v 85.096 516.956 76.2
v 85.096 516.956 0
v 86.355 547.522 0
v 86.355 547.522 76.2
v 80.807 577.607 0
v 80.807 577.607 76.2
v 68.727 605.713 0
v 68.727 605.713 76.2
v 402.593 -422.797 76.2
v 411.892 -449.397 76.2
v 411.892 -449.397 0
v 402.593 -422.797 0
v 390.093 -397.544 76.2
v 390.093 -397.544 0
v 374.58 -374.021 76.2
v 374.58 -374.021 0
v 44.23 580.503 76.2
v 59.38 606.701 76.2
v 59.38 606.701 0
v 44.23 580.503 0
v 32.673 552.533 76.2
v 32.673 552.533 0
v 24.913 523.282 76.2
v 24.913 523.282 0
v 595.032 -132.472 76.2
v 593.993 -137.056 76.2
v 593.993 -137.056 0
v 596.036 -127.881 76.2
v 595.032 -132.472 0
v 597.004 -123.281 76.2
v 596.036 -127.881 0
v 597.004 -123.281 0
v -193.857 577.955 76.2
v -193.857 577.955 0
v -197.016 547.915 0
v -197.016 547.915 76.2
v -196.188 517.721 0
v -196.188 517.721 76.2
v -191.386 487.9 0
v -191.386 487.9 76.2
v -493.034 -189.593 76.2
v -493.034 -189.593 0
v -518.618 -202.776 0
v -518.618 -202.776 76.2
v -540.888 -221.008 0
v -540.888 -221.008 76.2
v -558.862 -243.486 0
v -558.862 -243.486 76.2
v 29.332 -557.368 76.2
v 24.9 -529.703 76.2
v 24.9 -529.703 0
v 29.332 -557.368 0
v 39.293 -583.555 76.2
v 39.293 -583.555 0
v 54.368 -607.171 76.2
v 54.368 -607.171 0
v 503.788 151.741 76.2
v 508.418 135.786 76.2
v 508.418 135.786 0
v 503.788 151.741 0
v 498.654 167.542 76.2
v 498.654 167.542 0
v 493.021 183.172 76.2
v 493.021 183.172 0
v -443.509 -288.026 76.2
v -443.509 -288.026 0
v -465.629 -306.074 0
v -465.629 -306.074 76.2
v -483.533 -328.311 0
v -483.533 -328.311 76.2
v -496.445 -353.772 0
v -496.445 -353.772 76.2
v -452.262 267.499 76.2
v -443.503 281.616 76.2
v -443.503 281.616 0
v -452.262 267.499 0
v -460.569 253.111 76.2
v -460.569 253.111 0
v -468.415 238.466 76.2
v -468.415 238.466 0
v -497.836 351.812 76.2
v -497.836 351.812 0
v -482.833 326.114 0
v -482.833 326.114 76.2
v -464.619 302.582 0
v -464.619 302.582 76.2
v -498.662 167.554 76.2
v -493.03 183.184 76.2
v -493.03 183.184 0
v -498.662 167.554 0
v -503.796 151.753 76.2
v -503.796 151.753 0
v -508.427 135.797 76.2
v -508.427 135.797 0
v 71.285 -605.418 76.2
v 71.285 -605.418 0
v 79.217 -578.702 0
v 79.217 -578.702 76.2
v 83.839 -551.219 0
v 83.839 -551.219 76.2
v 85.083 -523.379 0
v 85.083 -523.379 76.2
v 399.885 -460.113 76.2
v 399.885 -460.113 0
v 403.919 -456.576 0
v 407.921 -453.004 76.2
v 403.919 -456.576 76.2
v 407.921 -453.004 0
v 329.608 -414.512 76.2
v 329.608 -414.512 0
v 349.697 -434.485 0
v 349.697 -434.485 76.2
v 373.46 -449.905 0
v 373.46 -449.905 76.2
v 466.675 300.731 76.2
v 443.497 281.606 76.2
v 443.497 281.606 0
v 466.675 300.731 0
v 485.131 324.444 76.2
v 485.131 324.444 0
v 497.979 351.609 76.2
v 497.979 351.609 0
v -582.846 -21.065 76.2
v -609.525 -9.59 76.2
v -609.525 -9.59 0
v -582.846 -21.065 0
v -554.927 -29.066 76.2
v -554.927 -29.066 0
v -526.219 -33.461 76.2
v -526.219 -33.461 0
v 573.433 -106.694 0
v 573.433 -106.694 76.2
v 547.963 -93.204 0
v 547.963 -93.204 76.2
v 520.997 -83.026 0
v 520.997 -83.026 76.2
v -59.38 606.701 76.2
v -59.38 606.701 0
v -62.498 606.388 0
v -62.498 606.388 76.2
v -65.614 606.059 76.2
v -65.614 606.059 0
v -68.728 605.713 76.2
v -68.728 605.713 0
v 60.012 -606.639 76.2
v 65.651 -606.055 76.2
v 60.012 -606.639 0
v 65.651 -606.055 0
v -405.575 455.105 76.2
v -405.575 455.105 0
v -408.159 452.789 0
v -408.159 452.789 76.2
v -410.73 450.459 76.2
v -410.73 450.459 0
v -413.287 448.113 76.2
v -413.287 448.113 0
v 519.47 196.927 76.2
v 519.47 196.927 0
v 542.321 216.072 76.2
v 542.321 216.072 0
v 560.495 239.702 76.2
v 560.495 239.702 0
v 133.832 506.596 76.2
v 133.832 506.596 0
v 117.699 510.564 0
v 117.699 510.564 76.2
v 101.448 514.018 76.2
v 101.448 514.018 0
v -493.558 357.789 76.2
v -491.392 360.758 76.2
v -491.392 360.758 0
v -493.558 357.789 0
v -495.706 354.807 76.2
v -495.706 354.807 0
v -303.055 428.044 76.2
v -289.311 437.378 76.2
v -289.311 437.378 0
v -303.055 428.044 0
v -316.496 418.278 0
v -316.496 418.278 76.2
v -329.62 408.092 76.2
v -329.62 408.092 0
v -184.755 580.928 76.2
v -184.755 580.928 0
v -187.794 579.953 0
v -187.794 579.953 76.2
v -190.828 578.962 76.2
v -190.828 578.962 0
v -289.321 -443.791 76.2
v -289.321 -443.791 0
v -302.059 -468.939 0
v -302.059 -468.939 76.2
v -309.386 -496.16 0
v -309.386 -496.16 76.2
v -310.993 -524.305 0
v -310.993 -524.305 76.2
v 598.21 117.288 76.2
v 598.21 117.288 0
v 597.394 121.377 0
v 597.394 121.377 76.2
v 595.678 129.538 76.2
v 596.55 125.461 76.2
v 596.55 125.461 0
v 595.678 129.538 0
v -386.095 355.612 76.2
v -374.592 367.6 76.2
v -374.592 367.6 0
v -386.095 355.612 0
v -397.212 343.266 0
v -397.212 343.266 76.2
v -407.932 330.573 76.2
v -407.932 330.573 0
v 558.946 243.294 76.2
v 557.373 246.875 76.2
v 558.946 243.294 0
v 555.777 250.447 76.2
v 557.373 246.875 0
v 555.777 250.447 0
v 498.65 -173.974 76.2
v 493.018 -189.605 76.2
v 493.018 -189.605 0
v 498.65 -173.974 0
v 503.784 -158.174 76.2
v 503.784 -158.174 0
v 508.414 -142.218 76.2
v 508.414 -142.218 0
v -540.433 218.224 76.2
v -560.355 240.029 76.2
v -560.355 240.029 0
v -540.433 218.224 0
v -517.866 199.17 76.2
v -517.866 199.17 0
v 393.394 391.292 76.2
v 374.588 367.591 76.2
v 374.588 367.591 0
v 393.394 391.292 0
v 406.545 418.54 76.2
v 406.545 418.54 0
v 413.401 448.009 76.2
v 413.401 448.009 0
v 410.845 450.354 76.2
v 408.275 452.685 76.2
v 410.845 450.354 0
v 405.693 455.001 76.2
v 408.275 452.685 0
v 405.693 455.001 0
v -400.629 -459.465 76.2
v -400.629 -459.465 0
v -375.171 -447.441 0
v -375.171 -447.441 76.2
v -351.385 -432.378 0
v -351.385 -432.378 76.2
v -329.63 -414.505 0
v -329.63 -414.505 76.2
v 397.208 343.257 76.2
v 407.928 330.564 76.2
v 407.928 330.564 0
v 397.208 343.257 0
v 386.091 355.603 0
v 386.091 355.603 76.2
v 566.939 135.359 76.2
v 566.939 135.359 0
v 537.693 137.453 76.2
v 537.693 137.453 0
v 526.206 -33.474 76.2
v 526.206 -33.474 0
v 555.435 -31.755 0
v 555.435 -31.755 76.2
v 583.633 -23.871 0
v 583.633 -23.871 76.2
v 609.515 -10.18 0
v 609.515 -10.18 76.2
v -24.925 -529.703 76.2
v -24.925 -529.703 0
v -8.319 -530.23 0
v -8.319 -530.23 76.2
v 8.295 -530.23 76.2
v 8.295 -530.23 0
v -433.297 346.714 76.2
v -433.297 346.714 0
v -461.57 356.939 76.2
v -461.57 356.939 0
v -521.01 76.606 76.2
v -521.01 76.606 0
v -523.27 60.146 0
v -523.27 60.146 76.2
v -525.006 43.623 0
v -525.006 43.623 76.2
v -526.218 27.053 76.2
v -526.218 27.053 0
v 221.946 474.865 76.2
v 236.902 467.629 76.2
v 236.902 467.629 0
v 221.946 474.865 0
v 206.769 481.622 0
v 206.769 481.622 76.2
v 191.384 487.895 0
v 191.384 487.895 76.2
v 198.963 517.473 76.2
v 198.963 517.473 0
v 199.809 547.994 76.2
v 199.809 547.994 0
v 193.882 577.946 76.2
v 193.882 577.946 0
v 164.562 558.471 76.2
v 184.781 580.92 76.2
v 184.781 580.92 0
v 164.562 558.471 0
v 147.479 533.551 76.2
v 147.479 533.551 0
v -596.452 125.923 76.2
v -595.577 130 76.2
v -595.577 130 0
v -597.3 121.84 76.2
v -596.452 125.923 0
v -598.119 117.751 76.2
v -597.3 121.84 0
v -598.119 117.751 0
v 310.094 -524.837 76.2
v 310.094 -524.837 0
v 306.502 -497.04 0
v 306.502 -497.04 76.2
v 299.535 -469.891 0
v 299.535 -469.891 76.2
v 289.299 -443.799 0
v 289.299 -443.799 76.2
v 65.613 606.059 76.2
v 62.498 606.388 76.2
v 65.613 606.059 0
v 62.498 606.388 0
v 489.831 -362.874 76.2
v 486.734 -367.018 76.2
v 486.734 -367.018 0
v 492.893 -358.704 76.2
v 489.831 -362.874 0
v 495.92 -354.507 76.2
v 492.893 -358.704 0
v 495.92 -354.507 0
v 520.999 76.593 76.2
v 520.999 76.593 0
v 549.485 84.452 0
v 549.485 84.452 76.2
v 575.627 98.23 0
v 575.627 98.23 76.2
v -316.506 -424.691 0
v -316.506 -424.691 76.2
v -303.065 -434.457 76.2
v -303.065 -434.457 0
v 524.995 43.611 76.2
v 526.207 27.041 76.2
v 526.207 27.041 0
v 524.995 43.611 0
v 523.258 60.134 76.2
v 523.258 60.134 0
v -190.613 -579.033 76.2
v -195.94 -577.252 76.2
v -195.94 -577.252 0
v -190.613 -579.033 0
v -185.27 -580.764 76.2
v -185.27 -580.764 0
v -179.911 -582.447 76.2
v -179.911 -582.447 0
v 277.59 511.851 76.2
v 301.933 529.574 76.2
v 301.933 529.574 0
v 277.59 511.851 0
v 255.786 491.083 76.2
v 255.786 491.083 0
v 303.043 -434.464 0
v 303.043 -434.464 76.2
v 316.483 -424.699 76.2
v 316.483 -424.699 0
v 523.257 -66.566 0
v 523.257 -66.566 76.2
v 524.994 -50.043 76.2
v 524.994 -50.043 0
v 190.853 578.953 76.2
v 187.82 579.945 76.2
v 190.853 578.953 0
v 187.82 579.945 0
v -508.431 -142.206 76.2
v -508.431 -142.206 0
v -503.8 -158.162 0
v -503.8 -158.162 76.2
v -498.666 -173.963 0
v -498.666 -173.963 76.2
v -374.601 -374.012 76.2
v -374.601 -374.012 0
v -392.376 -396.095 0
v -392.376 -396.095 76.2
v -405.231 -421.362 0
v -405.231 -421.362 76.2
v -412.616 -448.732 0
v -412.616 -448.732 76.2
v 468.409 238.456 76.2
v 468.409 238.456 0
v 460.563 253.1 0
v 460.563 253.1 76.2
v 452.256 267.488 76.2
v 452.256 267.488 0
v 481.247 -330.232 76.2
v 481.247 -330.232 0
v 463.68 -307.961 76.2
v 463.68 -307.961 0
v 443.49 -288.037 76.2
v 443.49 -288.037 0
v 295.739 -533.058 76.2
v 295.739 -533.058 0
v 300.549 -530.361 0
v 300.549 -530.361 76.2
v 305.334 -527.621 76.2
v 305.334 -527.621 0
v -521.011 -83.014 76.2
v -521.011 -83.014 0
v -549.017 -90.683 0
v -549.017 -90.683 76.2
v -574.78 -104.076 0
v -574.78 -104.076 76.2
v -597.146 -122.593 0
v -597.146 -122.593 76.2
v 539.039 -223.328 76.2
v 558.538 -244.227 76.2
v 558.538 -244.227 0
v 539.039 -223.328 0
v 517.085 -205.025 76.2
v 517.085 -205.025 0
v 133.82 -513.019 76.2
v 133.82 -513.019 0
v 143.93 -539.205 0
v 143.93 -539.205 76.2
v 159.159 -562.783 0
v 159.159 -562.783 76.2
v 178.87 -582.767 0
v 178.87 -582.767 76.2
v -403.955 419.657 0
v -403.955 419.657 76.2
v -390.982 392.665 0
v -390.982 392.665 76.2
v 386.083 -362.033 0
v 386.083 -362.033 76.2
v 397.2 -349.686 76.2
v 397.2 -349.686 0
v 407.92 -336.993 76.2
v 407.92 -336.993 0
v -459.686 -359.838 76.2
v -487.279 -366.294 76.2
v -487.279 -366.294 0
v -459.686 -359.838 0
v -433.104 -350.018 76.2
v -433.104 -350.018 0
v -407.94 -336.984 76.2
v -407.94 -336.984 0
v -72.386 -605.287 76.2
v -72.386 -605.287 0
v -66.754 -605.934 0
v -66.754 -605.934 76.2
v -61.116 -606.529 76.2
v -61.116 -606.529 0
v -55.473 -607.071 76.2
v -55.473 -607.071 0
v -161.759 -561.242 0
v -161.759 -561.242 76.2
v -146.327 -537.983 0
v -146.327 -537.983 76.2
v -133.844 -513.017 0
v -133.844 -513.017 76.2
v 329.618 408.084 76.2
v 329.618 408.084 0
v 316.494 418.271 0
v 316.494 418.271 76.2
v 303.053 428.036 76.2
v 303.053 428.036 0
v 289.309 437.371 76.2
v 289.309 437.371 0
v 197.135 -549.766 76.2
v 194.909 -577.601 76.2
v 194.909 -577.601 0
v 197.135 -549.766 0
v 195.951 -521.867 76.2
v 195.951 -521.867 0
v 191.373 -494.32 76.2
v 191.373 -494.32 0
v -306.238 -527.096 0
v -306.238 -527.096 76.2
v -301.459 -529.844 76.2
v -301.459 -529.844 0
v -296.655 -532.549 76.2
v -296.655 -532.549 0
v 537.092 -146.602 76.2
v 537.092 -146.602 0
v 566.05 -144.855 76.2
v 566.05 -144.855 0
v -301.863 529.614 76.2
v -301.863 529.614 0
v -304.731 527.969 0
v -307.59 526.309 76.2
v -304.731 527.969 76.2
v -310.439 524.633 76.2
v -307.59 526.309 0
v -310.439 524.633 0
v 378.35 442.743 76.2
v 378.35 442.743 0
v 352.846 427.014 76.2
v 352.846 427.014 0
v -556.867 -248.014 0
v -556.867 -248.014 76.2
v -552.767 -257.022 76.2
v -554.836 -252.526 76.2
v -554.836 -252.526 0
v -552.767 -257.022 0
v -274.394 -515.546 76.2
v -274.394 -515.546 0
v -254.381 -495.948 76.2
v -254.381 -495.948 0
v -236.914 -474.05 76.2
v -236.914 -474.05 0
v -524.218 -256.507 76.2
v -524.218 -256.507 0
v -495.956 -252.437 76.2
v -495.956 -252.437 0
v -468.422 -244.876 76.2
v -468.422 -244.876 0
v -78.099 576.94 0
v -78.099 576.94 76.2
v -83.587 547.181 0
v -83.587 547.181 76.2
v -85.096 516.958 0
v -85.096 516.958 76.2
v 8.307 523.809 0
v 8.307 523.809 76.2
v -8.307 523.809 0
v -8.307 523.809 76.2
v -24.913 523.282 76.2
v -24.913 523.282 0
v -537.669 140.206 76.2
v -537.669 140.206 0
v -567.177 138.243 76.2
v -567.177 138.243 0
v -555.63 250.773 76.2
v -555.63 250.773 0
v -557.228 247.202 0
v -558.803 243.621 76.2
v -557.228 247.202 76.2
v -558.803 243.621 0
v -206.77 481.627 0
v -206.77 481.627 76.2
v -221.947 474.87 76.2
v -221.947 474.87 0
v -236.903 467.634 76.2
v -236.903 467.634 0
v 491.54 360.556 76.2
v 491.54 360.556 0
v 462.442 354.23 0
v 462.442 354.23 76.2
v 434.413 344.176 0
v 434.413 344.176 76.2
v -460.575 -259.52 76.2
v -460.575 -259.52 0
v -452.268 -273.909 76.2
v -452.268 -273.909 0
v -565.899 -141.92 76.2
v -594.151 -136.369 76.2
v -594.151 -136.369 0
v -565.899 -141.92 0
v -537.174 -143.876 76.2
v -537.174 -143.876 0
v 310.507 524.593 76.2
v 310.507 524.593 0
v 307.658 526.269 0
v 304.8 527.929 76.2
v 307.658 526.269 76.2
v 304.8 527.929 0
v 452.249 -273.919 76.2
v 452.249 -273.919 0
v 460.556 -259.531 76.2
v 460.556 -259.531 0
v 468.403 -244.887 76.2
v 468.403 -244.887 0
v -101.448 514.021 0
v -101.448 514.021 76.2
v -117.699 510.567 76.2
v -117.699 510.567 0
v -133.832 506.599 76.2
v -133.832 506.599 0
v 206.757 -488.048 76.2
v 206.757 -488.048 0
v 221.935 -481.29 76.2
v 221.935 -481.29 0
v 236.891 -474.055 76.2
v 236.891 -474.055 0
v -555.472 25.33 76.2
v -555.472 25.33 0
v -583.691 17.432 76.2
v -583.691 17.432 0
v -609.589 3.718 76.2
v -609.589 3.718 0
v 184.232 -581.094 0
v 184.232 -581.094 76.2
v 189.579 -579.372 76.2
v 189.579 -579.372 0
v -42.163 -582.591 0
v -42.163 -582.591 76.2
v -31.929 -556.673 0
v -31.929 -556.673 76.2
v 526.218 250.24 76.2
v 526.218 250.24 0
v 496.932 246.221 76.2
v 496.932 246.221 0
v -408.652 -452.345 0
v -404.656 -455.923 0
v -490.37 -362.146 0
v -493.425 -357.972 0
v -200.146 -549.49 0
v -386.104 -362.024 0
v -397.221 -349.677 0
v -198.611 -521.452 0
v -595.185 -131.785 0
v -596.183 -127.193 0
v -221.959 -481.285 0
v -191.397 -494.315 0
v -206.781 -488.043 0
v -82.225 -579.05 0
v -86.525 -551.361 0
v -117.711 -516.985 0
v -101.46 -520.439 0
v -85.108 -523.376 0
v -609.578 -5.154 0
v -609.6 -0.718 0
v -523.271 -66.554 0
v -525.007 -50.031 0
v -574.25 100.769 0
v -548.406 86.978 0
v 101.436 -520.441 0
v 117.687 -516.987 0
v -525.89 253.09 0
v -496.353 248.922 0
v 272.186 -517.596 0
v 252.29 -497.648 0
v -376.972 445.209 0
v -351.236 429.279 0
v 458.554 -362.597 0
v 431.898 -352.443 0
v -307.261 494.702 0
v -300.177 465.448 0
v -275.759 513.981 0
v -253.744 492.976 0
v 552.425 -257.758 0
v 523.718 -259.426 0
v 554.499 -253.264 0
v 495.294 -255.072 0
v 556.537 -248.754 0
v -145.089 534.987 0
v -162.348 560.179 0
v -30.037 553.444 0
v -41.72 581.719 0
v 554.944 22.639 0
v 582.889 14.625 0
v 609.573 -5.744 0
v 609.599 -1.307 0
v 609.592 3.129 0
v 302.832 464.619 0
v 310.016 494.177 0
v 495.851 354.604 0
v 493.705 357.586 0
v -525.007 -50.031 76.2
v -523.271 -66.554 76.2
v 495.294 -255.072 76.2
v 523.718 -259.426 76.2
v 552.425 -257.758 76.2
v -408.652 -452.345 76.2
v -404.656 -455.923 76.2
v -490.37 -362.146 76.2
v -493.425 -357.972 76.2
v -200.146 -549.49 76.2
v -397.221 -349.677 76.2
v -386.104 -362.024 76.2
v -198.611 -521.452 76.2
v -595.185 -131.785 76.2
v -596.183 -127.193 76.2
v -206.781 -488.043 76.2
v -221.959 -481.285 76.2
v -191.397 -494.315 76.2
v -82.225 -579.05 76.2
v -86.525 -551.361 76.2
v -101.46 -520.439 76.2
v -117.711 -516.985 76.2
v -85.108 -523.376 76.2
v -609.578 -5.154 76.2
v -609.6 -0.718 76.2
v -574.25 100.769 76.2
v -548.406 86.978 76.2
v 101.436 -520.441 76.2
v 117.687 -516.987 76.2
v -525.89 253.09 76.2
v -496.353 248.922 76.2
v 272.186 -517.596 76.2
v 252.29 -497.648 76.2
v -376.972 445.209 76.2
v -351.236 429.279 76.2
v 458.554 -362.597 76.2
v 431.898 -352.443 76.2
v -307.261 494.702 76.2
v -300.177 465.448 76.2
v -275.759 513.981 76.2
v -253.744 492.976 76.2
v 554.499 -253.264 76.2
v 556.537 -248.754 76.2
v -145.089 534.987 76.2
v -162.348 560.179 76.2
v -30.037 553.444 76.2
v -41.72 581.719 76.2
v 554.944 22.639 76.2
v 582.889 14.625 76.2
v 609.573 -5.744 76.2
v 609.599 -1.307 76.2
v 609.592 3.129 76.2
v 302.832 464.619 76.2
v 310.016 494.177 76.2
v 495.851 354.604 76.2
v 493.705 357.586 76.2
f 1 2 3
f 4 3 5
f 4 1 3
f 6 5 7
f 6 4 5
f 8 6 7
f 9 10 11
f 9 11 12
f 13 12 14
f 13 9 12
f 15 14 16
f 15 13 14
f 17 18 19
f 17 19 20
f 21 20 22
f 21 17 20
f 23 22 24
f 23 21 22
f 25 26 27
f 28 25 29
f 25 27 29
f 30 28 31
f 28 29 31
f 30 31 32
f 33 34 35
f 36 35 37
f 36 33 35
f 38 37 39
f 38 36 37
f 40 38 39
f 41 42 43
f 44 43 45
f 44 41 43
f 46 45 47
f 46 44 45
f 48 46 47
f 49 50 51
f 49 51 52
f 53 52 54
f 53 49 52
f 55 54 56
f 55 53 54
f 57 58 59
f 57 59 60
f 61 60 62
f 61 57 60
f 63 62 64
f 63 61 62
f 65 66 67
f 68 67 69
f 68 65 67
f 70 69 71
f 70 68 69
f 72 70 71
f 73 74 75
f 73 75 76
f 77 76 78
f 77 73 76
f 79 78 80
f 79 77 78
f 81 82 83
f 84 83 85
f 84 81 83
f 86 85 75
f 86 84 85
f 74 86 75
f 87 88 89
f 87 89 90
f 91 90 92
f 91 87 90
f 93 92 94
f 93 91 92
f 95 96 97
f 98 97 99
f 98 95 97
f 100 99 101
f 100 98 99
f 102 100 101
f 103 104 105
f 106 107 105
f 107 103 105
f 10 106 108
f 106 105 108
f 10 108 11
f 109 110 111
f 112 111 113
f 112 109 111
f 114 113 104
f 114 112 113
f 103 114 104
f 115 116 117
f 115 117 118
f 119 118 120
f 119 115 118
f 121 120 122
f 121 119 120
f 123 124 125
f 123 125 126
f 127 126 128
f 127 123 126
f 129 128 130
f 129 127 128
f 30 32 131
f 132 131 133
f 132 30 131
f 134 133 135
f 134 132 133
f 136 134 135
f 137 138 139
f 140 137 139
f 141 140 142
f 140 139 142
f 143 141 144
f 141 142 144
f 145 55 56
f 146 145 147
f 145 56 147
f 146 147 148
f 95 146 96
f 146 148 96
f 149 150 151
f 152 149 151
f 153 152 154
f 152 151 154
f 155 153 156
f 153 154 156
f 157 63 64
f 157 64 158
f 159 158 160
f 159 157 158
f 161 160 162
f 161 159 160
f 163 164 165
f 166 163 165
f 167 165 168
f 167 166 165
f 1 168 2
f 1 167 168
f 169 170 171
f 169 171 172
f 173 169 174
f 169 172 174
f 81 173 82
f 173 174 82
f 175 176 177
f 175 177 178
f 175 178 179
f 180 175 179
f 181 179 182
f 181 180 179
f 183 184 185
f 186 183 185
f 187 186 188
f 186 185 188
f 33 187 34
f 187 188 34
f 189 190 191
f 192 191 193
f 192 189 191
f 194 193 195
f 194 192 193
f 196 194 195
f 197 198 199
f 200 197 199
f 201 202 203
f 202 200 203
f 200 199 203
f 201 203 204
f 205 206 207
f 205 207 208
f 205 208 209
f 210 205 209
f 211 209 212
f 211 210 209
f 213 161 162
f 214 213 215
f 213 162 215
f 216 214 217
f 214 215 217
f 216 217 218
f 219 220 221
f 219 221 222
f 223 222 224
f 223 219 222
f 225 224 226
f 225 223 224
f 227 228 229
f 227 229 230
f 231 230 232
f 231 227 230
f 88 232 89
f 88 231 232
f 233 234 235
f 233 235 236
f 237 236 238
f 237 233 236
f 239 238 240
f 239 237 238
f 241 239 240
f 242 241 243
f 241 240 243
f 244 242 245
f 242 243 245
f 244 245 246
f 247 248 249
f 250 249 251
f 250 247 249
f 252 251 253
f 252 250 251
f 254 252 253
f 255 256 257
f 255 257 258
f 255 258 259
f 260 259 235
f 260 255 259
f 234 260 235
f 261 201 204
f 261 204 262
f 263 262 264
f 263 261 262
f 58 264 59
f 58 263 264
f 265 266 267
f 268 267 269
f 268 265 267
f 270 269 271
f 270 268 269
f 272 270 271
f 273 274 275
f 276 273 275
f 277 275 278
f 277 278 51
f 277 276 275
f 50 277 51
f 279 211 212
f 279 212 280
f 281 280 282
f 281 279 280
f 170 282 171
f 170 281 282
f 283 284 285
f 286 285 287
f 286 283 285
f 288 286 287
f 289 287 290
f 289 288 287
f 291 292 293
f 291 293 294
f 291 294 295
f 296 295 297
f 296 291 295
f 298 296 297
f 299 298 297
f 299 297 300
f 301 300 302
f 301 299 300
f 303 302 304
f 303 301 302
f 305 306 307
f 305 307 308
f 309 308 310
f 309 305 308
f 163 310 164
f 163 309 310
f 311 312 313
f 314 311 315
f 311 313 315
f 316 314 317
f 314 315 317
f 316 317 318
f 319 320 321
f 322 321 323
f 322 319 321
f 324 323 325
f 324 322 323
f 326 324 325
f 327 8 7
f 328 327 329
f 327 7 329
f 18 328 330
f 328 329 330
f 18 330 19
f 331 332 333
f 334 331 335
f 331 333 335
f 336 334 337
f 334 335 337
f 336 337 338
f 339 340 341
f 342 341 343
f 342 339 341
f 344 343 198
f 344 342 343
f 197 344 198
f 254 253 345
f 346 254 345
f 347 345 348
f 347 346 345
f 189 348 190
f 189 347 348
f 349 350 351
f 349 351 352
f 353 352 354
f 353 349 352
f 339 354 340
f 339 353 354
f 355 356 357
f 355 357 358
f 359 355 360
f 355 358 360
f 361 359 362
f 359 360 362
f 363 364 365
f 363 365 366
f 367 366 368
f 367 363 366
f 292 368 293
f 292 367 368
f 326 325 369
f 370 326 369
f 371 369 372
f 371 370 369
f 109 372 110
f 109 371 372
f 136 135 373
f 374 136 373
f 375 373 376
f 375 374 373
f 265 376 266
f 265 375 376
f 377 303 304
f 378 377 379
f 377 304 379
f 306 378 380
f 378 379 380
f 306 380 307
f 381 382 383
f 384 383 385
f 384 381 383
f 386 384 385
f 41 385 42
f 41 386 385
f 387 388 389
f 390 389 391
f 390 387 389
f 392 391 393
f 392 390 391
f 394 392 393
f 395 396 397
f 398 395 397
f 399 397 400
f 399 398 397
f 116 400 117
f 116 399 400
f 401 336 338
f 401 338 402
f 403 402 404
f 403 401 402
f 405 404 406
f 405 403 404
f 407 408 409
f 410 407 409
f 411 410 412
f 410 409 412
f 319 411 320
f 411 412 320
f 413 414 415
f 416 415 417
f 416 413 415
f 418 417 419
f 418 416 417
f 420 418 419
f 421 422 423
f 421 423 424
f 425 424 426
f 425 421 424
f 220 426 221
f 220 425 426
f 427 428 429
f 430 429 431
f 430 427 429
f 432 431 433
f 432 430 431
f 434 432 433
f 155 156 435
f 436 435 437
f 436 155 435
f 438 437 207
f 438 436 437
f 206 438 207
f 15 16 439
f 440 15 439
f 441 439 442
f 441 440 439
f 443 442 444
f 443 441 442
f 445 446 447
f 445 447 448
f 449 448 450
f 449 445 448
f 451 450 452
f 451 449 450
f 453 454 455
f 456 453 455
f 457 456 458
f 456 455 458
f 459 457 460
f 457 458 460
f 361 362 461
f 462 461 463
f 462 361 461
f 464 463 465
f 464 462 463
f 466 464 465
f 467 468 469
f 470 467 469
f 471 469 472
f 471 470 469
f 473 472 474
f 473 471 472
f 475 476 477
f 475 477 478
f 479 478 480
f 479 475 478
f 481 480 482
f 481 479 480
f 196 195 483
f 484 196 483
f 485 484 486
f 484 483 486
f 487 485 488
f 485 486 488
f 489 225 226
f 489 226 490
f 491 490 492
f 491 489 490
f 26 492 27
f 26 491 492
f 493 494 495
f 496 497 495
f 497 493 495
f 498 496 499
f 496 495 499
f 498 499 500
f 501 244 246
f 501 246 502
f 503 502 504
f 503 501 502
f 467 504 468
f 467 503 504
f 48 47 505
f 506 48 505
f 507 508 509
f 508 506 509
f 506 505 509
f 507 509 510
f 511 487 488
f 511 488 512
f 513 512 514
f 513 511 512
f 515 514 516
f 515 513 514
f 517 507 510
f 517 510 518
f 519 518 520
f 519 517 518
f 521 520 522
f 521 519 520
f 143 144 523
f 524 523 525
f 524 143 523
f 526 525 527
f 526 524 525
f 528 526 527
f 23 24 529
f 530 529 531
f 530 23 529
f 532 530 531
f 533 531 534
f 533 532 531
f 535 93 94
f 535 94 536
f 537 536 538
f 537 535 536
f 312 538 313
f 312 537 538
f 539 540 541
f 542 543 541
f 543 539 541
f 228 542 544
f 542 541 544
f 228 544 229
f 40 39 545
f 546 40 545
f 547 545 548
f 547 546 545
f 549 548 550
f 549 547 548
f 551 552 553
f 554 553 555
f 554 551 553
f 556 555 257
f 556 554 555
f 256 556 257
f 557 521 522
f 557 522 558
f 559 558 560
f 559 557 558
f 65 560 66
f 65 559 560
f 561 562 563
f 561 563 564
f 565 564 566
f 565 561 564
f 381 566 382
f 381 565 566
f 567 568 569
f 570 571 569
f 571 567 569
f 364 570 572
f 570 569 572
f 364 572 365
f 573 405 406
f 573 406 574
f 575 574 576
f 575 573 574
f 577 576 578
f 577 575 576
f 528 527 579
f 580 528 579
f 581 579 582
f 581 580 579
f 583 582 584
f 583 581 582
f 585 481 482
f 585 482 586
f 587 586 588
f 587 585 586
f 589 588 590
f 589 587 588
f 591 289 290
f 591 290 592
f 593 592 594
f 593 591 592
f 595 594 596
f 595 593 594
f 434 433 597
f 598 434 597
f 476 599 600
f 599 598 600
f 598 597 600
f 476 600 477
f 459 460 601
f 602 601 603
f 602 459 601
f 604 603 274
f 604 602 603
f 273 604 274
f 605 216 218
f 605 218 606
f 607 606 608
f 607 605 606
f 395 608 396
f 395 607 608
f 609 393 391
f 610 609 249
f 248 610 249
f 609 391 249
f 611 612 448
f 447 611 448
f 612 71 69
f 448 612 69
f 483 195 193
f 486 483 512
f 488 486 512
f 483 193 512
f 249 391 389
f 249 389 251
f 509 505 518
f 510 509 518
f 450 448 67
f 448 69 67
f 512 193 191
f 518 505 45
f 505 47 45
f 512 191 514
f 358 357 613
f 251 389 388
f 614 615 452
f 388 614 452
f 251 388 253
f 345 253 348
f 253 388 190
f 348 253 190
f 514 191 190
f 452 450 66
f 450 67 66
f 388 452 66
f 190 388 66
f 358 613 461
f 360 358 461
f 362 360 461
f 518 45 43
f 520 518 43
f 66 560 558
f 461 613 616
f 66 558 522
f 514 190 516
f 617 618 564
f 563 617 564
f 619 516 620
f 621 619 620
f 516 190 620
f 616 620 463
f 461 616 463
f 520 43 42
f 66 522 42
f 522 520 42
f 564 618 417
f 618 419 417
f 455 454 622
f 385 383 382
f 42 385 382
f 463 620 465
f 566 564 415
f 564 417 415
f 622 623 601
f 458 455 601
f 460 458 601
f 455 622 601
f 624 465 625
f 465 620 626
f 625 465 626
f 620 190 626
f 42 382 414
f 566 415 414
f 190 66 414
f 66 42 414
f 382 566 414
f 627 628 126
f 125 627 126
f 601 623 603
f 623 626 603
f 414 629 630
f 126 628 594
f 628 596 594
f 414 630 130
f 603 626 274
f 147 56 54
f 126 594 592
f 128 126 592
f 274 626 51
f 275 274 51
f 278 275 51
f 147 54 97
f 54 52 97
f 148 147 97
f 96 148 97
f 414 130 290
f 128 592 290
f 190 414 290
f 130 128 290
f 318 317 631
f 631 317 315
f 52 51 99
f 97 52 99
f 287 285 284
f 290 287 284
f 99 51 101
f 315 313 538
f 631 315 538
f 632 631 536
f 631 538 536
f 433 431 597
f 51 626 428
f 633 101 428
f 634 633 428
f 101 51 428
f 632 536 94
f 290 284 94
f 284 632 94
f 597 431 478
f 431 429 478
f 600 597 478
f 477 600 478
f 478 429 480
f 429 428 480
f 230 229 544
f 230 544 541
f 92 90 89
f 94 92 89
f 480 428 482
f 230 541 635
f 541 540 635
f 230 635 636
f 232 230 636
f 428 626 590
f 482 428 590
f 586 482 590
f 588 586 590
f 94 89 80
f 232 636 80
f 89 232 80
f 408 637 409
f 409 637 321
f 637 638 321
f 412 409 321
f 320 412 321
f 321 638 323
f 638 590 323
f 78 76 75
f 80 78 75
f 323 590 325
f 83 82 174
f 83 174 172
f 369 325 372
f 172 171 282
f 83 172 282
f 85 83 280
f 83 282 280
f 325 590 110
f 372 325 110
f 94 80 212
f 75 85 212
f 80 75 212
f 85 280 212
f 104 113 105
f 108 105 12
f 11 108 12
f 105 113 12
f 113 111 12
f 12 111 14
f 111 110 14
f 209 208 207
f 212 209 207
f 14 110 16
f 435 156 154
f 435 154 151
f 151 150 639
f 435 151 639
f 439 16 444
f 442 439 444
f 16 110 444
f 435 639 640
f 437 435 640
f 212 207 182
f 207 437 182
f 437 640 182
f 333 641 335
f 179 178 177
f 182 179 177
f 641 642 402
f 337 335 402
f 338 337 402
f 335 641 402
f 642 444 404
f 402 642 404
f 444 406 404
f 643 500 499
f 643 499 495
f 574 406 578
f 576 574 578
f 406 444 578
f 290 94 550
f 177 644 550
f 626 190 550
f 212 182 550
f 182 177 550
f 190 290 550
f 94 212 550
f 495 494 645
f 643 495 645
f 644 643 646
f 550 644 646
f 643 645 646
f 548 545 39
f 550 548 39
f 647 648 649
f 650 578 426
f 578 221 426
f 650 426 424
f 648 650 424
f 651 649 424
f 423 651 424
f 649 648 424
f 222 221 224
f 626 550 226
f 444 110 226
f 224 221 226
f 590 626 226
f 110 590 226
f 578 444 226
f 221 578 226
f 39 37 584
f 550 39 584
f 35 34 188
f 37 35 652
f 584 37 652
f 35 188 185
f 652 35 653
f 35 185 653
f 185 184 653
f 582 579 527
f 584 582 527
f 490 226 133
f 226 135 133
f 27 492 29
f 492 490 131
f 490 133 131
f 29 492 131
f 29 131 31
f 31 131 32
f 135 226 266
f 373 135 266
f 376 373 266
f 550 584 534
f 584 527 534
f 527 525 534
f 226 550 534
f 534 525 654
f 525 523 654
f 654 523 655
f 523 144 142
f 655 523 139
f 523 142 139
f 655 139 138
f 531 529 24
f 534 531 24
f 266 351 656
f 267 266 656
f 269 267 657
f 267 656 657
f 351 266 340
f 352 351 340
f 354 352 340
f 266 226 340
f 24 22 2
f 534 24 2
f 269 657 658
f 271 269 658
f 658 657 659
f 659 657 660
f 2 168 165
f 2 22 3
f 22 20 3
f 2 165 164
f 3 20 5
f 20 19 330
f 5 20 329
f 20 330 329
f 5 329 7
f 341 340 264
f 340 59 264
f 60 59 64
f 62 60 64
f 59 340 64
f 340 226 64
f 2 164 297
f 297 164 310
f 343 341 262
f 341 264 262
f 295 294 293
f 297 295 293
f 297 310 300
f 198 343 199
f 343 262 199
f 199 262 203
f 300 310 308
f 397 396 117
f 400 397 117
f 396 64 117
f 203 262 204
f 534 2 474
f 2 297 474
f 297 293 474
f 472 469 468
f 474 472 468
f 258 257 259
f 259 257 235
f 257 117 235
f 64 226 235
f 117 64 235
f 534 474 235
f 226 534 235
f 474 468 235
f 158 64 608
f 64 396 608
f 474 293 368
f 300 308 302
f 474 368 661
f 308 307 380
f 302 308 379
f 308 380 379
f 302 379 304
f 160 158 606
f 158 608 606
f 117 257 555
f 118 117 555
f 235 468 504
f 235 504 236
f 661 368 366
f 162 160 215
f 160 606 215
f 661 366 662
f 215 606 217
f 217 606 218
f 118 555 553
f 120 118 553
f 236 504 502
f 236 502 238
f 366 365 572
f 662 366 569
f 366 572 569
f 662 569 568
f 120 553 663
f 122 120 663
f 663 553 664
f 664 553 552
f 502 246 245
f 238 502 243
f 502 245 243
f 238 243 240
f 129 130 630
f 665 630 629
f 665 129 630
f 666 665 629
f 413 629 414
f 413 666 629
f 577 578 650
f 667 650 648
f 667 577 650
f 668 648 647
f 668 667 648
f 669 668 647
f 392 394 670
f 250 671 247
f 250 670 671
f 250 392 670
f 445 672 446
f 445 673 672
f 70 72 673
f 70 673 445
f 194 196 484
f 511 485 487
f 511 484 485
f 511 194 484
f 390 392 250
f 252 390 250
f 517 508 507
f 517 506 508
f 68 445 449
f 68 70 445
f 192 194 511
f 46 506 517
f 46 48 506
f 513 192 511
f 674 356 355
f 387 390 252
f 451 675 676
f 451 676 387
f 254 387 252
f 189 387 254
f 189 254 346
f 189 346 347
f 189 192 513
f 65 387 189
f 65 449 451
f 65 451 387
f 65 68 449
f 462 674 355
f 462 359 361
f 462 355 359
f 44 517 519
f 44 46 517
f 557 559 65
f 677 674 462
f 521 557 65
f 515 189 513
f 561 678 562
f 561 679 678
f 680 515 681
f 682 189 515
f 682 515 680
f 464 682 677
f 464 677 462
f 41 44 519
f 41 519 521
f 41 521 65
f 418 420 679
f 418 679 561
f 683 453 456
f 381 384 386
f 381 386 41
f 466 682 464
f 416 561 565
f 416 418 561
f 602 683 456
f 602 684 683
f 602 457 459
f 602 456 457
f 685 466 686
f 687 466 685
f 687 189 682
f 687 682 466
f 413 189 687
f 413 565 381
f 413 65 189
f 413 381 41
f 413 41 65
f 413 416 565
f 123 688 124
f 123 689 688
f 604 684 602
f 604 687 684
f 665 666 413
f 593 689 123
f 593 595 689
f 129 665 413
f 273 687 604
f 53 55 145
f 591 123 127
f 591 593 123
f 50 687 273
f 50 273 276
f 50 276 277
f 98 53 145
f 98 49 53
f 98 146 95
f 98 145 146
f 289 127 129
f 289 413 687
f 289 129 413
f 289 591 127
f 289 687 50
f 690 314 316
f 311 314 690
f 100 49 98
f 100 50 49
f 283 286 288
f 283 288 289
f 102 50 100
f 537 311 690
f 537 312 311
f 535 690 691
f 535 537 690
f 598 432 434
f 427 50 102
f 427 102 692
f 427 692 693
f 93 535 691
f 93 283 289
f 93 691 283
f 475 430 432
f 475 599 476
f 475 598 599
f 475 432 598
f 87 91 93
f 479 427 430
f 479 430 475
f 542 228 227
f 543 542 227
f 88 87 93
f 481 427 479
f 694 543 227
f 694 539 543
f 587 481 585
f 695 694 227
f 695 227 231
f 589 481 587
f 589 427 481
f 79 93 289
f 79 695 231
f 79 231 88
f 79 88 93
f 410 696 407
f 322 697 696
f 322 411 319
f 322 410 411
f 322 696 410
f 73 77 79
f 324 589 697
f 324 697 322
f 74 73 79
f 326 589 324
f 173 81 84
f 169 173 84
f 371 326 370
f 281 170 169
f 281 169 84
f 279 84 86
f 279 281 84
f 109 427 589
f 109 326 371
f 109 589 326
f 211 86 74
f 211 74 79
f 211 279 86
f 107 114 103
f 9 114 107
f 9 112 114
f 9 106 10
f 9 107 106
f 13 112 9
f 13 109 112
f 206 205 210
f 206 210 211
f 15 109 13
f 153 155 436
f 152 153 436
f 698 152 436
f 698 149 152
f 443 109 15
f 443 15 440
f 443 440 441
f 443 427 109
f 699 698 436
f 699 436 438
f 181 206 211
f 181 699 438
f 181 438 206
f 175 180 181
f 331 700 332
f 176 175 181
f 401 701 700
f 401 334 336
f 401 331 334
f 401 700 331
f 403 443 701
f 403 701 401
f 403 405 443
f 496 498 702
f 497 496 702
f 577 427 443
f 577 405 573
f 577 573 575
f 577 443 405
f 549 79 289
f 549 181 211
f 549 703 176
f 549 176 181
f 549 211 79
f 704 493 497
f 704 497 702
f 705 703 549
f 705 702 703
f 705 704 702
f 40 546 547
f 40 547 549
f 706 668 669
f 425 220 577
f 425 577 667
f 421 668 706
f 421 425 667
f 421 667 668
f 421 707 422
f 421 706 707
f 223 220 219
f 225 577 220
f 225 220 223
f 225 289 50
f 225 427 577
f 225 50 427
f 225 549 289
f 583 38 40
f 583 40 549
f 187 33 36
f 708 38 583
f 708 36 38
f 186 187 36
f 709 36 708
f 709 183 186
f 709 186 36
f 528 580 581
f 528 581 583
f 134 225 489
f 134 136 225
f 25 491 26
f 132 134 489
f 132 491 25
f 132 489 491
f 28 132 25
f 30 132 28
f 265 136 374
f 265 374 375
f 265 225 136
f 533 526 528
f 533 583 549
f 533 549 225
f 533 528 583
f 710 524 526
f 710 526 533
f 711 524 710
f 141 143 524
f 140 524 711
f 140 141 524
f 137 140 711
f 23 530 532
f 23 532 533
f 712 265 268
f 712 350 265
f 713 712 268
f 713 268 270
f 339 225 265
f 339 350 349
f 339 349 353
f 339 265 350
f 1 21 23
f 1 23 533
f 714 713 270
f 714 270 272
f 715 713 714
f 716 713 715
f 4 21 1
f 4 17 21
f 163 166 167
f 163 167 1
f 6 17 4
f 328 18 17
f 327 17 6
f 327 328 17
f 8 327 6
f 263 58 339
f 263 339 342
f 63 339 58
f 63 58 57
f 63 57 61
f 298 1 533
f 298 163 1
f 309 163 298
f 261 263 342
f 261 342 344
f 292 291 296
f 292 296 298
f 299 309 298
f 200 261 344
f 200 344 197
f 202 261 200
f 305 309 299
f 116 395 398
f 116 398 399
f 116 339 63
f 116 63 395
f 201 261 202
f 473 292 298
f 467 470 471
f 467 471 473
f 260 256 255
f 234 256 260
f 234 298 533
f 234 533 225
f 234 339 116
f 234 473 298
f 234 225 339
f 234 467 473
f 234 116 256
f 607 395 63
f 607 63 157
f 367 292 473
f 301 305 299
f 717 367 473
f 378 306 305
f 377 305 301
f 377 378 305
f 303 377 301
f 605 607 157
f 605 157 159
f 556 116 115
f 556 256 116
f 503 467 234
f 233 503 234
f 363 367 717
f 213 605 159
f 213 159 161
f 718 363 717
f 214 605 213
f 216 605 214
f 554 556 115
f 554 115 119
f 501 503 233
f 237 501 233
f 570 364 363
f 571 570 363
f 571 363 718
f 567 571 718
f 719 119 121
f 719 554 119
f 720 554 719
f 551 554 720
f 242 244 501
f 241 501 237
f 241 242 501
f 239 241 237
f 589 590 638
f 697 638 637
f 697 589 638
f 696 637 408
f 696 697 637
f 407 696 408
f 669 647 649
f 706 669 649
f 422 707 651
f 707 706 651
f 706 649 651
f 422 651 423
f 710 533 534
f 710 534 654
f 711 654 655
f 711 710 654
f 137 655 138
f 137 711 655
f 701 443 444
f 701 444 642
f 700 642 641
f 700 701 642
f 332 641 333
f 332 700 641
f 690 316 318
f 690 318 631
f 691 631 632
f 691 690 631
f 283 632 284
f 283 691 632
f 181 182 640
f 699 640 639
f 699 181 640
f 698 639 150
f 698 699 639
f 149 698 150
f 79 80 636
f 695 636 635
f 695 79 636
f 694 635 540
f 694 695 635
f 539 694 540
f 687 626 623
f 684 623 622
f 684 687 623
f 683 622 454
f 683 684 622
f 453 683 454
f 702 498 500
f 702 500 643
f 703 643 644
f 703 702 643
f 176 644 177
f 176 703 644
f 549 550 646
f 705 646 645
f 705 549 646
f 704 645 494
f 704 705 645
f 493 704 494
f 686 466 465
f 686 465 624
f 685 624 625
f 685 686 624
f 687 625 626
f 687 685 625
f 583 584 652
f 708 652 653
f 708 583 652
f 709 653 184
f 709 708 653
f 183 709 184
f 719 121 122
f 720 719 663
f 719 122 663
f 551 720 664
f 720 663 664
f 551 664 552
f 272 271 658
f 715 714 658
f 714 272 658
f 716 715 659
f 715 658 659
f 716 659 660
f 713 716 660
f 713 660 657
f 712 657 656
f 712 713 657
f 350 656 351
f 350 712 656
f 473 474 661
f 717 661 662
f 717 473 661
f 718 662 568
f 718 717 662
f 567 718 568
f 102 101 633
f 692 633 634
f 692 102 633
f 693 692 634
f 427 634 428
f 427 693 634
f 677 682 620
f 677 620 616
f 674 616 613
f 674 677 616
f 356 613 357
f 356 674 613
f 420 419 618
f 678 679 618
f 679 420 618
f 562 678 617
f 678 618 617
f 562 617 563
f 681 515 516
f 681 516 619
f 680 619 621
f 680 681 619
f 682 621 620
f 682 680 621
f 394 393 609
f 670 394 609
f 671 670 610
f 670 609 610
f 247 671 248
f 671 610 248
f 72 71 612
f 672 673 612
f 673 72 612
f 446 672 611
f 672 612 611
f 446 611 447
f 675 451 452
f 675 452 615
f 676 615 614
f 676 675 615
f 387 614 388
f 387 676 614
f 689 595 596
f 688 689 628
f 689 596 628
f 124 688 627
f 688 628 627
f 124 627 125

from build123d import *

# Parameters (mm, degrees)
SKETCH2_R           = 609.6
BOSS_EXTRUDE2_DEPTH = 76.2
CUT_EXTRUDE1_DEPTH  = 77.2
CIRPATTERN1_COUNT   = 30


with BuildPart() as part:
    # Sketch2 → Boss-Extrude2 (new body)
    with BuildSketch(Plane.XY):
        Circle(SKETCH2_R)
    extrude(amount=BOSS_EXTRUDE2_DEPTH)

    # Sketch3 → Cut-Extrude1 (cut, through all)
    with BuildSketch(Plane.XY.offset(76.2)):
        with BuildLine():
            ThreePointArc((24.912616177, 523.282311167), (0, 523.875), (-24.912616177, 523.282311167))
            ThreePointArc((-24.912616177, 523.282311167), (-35.087110683, 567.908462249), (-59.380088455, 606.701050844))
            ThreePointArc((-59.380088455, 606.701050844), (0, 609.6), (59.380088455, 606.701050844))
            ThreePointArc((59.380088455, 606.701050844), (37.988368572, 566.709702519), (24.912616177, 523.282311167))
        make_face()
    cut_extrude1 = extrude(amount=-CUT_EXTRUDE1_DEPTH, mode=Mode.SUBTRACT)

    # CirPattern1: Cut-Extrude1 ×30 about axis
    cirpattern1_axis = Axis((-0.006195071, -3.21023047, 0), (0, 0, 1))
    for i in range(1, CIRPATTERN1_COUNT):
        add(cut_extrude1.rotate(cirpattern1_axis, i * 360 / CIRPATTERN1_COUNT), mode=Mode.SUBTRACT)


solid = part.part
